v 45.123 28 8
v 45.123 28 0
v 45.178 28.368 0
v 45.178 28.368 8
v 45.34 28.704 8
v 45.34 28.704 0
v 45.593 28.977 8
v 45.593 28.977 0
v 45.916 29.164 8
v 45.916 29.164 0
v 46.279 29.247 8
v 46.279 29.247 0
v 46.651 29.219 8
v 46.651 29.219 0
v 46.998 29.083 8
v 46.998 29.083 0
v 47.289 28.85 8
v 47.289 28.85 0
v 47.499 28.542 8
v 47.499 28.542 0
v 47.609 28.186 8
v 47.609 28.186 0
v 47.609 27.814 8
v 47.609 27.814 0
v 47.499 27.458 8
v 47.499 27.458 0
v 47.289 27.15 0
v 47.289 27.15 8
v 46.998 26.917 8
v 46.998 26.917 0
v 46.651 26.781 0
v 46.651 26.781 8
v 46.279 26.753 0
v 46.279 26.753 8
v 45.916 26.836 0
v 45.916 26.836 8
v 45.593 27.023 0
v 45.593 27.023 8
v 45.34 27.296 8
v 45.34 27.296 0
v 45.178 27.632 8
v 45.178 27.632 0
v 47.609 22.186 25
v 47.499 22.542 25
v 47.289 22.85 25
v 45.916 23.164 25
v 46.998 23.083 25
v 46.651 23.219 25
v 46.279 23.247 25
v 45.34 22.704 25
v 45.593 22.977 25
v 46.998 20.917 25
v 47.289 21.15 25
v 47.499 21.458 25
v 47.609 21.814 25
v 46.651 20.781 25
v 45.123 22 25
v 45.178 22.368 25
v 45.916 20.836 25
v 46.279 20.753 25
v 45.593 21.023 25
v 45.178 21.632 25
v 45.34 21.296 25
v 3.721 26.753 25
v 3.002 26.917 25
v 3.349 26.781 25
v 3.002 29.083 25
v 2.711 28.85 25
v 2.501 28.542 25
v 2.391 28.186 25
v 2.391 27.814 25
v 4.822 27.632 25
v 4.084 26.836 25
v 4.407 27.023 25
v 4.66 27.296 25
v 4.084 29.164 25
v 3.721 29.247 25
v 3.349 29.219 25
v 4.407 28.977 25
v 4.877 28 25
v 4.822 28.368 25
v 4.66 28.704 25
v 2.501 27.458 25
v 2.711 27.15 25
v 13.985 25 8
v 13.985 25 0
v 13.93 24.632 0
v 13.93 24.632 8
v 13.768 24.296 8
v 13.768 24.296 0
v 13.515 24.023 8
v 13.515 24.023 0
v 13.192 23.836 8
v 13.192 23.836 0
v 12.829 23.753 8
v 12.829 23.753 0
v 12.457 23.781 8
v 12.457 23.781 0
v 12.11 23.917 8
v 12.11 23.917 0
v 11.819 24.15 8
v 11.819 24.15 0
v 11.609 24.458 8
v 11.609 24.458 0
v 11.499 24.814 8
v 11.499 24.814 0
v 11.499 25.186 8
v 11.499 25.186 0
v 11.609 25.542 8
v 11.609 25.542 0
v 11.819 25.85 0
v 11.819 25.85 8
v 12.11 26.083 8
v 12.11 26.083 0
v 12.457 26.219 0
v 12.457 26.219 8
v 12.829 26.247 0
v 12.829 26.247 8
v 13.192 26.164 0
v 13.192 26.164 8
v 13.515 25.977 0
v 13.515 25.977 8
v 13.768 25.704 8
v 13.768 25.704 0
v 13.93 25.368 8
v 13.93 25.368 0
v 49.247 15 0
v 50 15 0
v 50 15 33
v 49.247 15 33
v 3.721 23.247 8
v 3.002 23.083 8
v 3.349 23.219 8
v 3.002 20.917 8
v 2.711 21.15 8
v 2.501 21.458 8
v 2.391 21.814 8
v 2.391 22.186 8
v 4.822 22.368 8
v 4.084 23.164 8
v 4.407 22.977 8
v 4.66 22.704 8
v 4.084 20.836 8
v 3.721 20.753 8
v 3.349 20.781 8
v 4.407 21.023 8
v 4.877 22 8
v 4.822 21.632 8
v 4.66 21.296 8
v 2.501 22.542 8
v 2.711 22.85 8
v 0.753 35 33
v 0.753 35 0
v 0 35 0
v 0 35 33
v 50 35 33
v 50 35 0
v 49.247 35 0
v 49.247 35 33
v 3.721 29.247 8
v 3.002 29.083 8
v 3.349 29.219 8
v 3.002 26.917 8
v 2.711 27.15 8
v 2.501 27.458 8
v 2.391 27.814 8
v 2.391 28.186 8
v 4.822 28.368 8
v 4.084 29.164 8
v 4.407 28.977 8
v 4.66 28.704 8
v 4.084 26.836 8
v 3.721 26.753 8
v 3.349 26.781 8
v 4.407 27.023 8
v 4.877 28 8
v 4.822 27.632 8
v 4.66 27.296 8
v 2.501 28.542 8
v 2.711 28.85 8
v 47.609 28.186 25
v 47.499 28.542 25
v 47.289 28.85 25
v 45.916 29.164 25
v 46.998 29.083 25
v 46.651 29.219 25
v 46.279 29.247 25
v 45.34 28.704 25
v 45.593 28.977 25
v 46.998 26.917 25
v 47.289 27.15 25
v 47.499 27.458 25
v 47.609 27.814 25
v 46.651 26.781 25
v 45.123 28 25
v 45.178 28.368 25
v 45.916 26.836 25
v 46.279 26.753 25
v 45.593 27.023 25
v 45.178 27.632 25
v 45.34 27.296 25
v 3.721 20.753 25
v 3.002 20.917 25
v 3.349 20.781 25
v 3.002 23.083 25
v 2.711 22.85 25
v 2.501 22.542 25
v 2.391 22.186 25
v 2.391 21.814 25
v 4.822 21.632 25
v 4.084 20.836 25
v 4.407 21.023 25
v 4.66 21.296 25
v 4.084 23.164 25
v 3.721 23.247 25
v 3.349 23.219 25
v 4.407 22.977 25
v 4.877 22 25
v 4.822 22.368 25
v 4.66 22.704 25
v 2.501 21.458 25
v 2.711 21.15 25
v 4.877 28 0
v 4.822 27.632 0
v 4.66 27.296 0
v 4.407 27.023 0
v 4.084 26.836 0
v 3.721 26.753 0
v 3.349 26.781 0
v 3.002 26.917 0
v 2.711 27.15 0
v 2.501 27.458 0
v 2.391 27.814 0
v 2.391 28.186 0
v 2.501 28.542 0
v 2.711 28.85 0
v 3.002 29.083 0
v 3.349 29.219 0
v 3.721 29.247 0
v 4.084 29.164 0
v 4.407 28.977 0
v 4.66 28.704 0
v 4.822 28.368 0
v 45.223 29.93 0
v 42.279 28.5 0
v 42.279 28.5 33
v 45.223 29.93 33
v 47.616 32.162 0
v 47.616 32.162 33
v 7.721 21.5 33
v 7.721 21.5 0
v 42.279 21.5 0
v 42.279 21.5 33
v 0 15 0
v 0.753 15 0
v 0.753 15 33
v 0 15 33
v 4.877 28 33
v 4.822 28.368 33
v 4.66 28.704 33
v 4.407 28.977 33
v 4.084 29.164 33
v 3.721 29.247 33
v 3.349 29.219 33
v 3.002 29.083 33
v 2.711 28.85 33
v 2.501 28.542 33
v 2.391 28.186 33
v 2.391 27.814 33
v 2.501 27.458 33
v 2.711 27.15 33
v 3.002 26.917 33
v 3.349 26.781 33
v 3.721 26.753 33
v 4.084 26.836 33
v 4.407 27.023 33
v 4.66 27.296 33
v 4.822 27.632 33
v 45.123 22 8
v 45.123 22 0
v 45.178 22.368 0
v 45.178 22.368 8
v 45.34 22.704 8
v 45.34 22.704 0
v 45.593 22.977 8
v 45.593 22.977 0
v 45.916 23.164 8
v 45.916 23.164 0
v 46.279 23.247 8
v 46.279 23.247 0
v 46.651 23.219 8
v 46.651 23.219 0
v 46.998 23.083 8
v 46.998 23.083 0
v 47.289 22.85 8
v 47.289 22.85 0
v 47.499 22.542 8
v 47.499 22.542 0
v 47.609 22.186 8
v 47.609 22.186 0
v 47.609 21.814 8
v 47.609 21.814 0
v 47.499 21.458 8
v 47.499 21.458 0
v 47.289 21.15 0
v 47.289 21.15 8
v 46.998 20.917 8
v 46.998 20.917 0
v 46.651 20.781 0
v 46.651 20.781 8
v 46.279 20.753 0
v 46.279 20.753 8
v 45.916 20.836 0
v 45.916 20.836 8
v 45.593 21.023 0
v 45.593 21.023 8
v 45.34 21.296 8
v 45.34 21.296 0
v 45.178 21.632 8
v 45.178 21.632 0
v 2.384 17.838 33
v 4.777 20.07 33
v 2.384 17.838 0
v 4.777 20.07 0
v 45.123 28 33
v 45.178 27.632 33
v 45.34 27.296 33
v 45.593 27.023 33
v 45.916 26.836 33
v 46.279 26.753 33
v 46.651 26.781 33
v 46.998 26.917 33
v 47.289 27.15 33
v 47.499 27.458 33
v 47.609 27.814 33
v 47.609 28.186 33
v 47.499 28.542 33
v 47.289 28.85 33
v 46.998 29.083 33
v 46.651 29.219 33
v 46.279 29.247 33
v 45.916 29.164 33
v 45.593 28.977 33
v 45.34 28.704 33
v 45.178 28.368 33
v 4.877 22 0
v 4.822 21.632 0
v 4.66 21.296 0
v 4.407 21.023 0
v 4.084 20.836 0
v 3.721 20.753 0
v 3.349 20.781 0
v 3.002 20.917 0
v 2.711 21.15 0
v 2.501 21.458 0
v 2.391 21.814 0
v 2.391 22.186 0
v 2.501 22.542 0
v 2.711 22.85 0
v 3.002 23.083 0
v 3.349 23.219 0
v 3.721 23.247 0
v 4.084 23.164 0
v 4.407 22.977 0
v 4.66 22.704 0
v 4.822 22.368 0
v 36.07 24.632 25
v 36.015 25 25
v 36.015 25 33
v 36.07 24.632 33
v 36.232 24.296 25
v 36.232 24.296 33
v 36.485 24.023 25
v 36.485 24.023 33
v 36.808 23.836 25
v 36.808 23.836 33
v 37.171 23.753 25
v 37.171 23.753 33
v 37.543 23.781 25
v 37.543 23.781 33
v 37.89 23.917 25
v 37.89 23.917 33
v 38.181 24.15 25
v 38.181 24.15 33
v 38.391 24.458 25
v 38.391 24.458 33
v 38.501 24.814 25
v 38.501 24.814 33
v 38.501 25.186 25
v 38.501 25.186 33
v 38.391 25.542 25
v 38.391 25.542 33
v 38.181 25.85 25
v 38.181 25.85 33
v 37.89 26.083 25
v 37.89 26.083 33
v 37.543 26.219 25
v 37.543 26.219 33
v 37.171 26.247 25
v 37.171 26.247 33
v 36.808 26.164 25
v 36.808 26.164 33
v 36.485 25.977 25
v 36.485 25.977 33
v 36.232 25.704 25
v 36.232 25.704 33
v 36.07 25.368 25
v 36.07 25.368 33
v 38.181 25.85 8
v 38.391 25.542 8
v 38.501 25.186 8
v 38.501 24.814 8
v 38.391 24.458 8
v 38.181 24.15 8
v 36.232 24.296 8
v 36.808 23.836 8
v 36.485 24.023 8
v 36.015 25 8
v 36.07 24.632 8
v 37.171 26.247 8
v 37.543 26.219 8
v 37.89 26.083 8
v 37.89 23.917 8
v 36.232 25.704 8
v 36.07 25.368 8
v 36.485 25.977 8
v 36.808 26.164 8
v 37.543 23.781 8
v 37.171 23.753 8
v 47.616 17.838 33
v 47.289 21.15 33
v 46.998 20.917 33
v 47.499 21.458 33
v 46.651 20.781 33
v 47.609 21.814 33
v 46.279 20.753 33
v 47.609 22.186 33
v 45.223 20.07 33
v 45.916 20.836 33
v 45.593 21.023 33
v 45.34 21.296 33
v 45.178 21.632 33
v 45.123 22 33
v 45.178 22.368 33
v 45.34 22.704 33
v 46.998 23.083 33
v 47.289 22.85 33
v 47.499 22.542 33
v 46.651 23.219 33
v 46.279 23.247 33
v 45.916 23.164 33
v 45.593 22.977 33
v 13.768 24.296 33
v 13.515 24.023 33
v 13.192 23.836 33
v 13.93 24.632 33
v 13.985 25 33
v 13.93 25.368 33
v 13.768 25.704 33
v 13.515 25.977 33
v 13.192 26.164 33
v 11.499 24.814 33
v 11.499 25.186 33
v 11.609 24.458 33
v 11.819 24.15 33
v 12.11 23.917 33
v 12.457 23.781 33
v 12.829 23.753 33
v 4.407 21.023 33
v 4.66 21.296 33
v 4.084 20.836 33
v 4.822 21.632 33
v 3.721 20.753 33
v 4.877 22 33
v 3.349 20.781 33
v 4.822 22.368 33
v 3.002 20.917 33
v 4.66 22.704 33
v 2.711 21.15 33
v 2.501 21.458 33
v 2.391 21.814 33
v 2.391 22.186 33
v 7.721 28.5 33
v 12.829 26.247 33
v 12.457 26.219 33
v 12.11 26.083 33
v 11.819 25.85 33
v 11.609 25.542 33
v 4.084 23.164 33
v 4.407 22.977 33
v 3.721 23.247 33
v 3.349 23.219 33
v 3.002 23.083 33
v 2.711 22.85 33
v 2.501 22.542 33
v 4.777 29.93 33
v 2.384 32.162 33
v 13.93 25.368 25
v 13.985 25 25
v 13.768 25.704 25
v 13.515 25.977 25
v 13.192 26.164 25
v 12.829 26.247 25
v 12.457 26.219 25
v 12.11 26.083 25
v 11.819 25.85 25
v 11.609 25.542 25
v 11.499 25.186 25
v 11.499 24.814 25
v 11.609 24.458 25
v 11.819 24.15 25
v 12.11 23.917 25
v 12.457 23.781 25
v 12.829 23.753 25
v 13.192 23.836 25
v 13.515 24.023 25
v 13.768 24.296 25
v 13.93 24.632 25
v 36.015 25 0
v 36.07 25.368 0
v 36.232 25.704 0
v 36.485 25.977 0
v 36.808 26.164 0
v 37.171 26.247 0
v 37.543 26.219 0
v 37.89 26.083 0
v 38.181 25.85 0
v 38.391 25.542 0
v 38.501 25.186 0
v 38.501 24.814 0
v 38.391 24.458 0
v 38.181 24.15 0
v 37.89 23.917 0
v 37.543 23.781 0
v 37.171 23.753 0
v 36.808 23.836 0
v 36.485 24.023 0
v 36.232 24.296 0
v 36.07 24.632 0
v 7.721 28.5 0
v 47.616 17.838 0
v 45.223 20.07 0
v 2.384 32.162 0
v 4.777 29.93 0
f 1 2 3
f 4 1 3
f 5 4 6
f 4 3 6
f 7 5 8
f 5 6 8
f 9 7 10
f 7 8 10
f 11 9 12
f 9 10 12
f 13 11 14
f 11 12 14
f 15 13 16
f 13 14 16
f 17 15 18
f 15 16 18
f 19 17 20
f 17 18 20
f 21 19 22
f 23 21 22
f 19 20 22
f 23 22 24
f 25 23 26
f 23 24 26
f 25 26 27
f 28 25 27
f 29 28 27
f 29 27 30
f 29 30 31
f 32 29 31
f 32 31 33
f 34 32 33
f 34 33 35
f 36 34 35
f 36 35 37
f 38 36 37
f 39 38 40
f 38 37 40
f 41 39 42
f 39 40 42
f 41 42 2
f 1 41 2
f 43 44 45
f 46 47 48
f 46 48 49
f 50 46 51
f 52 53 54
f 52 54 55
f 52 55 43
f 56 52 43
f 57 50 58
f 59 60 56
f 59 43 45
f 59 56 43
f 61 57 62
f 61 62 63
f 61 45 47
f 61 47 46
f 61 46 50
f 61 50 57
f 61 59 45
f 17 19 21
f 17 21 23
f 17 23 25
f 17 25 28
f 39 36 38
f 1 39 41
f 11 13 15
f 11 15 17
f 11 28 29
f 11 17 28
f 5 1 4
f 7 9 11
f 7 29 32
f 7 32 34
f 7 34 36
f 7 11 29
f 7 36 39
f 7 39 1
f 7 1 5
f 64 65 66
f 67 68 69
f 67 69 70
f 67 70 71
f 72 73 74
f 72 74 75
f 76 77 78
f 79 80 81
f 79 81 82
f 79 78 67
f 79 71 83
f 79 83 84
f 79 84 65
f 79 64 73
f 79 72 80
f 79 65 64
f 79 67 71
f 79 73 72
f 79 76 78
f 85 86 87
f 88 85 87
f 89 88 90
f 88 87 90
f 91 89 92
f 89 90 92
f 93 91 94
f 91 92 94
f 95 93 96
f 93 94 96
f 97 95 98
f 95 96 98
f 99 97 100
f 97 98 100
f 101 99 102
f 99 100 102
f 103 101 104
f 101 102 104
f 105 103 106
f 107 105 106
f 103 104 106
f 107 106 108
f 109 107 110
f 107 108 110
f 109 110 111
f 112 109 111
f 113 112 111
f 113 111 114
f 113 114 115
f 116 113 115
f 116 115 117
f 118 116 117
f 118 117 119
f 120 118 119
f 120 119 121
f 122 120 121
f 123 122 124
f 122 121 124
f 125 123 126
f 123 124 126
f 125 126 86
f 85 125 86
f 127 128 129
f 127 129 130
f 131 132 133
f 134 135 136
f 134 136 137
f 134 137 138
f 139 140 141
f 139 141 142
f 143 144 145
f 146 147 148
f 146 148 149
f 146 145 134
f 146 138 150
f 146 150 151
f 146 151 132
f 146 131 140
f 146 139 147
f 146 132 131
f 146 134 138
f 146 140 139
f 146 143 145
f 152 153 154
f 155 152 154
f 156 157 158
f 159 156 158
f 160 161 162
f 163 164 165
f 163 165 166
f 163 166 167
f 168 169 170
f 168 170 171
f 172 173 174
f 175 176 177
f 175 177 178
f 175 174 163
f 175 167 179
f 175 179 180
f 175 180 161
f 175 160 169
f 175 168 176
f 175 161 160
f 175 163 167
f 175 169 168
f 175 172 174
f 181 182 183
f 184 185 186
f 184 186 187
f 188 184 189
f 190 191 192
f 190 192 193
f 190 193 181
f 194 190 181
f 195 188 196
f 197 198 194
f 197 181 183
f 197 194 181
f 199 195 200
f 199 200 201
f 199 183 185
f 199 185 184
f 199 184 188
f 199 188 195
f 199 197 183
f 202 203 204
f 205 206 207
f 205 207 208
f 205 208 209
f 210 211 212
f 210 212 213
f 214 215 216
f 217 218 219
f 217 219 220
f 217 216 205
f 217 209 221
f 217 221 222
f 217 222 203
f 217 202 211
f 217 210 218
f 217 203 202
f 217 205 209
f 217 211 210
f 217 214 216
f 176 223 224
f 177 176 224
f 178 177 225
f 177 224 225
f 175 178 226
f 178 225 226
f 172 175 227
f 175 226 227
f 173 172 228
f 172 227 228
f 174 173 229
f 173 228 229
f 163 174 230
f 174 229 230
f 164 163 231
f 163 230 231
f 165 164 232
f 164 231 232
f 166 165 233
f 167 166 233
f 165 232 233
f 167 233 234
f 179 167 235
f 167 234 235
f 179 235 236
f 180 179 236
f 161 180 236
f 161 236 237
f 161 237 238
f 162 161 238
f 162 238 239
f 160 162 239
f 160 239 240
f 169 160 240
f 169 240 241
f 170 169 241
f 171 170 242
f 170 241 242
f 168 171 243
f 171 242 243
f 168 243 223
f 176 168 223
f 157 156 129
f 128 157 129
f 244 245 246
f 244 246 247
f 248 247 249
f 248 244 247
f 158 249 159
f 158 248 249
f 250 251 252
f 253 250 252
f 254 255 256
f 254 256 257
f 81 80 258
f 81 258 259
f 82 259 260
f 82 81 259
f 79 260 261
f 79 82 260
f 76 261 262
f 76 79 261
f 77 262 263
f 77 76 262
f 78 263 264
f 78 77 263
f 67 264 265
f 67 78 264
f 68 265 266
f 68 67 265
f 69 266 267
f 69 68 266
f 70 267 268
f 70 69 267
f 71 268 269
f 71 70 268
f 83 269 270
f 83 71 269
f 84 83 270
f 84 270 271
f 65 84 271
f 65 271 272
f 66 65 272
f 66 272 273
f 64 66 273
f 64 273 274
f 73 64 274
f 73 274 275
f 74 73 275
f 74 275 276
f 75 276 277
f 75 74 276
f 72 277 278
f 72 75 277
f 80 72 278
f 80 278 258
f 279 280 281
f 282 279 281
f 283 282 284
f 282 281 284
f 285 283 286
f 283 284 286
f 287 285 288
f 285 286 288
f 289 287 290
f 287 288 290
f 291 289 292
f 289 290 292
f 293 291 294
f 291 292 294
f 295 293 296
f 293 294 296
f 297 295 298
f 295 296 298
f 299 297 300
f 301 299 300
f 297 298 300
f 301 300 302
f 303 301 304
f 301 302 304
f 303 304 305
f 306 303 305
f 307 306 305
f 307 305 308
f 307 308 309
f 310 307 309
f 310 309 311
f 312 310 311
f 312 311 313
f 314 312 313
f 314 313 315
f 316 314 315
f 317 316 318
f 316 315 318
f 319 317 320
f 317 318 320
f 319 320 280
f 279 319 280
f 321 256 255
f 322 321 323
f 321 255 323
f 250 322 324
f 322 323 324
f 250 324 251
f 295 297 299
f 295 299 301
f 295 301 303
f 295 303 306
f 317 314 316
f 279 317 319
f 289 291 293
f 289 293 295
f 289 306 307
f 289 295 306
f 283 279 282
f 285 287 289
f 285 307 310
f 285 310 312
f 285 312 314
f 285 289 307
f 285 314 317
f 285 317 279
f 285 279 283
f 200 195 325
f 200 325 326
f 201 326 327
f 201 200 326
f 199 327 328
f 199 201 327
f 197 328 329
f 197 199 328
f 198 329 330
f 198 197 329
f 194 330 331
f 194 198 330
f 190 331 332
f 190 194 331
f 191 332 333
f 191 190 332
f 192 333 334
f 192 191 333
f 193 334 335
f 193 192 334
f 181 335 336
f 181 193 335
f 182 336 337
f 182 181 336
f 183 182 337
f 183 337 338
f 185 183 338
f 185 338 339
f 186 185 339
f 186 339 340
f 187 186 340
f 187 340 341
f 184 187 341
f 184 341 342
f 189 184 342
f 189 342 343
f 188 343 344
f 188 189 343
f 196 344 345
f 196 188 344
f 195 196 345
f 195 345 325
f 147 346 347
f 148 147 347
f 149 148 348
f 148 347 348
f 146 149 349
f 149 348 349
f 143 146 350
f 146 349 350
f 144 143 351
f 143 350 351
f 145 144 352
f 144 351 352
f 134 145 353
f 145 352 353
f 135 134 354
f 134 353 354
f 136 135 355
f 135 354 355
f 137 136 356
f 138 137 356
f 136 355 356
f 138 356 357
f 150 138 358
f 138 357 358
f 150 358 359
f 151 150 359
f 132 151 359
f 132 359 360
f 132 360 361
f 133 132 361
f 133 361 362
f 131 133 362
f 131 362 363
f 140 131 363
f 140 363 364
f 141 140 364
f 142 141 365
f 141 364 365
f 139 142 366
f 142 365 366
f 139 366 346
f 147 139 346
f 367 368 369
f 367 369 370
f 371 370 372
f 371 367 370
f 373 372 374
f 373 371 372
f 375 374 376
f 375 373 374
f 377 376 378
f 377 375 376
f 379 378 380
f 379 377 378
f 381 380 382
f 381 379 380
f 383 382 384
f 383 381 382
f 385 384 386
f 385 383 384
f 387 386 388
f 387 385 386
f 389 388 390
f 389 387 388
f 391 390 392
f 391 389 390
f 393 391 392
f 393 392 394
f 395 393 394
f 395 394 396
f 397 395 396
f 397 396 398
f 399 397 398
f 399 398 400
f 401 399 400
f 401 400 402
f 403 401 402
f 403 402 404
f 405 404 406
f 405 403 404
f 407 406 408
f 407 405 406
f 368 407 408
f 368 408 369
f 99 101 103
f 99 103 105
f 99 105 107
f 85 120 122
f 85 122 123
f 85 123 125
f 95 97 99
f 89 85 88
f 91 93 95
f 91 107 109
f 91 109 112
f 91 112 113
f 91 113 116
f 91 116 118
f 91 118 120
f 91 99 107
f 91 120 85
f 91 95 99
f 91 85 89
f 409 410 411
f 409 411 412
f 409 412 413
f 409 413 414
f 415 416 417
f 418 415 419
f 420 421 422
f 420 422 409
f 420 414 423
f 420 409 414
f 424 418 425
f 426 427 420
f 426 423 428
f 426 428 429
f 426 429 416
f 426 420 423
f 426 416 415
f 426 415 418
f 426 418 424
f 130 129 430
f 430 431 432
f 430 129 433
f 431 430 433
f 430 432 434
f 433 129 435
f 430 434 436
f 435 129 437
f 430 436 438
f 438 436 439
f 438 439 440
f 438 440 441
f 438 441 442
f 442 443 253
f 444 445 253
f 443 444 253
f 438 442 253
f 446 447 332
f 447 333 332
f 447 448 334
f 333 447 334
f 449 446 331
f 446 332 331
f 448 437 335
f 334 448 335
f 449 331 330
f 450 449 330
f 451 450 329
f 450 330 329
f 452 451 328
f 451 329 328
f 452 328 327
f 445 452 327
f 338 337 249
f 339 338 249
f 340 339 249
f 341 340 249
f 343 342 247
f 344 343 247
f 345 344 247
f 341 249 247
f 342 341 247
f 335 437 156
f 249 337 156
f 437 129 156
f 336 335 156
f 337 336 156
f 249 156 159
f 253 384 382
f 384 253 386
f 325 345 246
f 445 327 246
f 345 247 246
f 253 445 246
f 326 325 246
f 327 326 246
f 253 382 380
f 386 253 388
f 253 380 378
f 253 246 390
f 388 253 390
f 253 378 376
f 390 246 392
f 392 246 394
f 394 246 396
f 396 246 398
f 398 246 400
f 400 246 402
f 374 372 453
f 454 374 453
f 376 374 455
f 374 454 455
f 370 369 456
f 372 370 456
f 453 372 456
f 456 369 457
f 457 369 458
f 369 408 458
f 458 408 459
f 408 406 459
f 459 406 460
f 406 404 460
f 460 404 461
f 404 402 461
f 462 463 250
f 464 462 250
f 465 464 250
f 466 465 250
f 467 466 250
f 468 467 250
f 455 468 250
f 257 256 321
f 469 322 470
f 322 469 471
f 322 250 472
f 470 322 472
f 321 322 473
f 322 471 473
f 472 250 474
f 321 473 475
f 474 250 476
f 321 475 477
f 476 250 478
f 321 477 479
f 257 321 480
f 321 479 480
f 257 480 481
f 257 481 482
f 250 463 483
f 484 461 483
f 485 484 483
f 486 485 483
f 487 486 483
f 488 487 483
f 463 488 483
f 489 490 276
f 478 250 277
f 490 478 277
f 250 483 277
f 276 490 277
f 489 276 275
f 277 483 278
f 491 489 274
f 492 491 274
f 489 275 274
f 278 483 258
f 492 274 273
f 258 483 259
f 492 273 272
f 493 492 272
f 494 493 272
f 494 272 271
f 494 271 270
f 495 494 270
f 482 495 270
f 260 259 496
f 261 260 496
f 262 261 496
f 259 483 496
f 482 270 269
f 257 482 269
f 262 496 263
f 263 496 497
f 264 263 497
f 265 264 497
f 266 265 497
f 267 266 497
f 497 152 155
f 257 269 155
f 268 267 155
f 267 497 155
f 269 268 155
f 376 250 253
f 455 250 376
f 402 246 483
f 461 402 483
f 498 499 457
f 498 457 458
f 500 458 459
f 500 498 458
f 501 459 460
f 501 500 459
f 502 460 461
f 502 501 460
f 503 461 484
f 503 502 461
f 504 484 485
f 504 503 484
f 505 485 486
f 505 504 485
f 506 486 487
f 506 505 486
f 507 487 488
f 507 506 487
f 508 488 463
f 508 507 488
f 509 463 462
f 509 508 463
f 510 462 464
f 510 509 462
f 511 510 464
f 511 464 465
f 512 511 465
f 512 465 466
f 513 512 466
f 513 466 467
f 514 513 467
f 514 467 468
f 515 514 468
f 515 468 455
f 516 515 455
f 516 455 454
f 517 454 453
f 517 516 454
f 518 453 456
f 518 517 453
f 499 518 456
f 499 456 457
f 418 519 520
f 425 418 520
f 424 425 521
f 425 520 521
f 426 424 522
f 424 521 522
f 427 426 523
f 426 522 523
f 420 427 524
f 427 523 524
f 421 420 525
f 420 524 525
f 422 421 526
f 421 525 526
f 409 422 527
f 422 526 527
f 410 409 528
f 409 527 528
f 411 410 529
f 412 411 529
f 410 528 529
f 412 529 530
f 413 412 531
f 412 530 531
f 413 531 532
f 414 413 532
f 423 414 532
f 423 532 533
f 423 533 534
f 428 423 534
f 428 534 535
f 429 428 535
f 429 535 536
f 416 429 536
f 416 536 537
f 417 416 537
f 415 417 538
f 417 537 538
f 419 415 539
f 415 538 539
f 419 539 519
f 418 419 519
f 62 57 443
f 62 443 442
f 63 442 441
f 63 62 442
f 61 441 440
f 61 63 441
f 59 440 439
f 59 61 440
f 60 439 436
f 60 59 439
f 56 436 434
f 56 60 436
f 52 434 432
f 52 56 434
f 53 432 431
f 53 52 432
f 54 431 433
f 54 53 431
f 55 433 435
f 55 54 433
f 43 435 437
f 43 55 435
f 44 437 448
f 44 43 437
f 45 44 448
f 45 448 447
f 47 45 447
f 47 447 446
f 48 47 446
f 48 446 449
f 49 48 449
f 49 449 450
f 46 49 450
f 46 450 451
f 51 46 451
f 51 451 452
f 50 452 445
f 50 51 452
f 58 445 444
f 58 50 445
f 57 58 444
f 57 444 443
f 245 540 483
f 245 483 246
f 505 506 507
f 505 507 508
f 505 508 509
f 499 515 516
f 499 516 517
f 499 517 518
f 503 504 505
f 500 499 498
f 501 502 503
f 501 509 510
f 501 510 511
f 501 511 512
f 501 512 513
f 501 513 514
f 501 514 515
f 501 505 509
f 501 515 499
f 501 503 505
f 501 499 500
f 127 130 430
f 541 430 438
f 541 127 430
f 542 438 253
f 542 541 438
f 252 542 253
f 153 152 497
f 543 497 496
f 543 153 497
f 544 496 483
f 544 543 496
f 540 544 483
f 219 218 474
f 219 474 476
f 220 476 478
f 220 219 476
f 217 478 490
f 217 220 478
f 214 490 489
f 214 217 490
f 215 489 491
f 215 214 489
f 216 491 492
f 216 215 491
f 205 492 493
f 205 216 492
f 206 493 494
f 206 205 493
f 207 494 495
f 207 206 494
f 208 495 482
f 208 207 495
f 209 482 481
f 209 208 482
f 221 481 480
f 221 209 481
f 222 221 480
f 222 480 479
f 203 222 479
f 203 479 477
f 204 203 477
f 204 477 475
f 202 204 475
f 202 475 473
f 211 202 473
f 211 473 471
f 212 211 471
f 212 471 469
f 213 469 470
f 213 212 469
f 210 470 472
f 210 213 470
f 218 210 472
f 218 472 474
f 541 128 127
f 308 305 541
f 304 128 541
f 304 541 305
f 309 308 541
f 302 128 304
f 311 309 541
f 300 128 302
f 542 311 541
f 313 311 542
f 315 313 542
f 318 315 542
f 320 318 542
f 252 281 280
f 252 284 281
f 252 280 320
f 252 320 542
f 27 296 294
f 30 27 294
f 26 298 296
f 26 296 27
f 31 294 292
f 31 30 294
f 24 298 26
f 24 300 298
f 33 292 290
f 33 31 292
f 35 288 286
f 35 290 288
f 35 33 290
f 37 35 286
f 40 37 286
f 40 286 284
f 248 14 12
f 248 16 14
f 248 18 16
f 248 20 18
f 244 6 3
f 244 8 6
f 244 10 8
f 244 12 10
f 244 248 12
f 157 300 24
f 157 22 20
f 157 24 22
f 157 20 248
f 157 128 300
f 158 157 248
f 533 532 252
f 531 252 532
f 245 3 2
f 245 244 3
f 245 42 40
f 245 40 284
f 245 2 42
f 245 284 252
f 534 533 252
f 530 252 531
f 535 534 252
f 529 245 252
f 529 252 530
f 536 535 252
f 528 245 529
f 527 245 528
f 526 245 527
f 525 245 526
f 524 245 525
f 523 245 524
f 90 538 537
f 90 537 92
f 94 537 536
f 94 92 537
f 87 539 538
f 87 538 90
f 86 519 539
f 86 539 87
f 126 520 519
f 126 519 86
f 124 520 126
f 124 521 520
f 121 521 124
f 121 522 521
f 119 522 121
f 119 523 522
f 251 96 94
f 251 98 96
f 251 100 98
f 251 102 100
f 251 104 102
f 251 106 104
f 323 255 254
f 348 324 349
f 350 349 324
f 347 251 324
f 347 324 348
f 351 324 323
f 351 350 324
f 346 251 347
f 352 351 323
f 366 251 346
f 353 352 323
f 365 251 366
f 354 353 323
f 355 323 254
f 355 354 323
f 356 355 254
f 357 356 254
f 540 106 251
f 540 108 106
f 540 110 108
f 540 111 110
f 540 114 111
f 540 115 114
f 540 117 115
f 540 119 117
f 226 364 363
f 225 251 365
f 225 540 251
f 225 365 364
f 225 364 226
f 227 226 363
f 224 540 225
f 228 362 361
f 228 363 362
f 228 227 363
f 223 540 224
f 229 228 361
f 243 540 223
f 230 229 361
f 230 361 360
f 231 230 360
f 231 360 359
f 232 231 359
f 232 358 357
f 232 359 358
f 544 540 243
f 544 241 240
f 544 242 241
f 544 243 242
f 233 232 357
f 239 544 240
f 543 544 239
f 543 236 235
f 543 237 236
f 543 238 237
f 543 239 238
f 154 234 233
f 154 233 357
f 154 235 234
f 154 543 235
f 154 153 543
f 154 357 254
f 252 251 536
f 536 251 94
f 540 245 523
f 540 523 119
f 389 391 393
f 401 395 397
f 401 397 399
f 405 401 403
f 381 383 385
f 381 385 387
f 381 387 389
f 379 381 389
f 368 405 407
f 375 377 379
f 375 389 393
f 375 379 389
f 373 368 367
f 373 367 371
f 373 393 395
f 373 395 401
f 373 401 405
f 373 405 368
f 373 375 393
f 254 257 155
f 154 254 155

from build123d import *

# Parameters (mm, degrees)
SKETCH_3_W          = 50
SKETCH_3_H          = 7
EXTRUDE_1_DEPTH     = 33
EXTRUDE_2_DEPTH     = 33
SKETCH_5_R          = 1.25
CUT_EXTRUDE_1_DEPTH = 8
SKETCH_6_W          = 50
SKETCH_6_H          = 4
CUT_EXTRUDE_2_DEPTH = 40
CUT_EXTRUDE_START   = -8
SKETCH_7_R          = 1.25
CUT_EXTRUDE_3_DEPTH = 8


with BuildPart() as part:
    # 草图3 → 凸台-拉伸1 (new body)
    with BuildSketch(Plane.XY):
        with Locations((25, 25)):
            Rectangle(SKETCH_3_W, SKETCH_3_H)
    extrude(amount=EXTRUDE_1_DEPTH)

    # 草图4 → 凸台-拉伸2 (add)
    with BuildSketch(Plane(origin=(0, 0, 0), x_dir=(-1, 0, 0), z_dir=(0, 0, -1))):
        with BuildLine():
            Line((-50, 21.5), (-50, 11))
            ThreePointArc((-50, 11), (-47.86188219, 17.51667431), (-42.278719262, 21.5))
            Line((-42.278719262, 21.5), (-50, 21.5))
        make_face()
        with BuildLine():
            Line((-7.721280738, 21.5), (0, 21.5))
            Line((0, 21.5), (0, 11))
            ThreePointArc((0, 11), (-2.13811781, 17.51667431), (-7.721280738, 21.5))
        make_face()
        with BuildLine():
            Line((0, 28.5), (0, 39))
            ThreePointArc((0, 39), (-2.13811781, 32.48332569), (-7.721280738, 28.5))
            Line((-7.721280738, 28.5), (0, 28.5))
        make_face()
        with BuildLine():
            Line((-50, 28.5), (-42.278719262, 28.5))
            ThreePointArc((-42.278719262, 28.5), (-47.86188219, 32.48332569), (-50, 39))
            Line((-50, 39), (-50, 28.5))
        make_face()
    extrude(amount=-EXTRUDE_2_DEPTH)

    # 草图5 → 切除-拉伸1 (cut)
    with BuildSketch(Plane(origin=(0, 0, 0), x_dir=(-1, 0, 0), z_dir=(0, 0, -1))):
        with Locations((-46.372516673, 28)):
            Circle(SKETCH_5_R)
        with Locations((-46.372516673, 22)):
            Circle(SKETCH_5_R)
        with Locations((-37.264513071, 25)):
            Circle(SKETCH_5_R)
        with Locations(Location((-3.627483327, 22, 0), (0, 0, 180))):
            Circle(SKETCH_5_R)
        with Locations(Location((-3.627483327, 28, 0), (0, 0, 180))):
            Circle(SKETCH_5_R)
        with Locations(Location((-12.735486929, 25, 0), (0, 0, 180))):
            Circle(SKETCH_5_R)
    extrude(amount=-CUT_EXTRUDE_1_DEPTH, mode=Mode.SUBTRACT)

    # 草图6 → 切除-拉伸2 (cut)
    with BuildSketch(Plane(origin=(0, 0, 0), x_dir=(-1, 0, 0), z_dir=(0, 0, -1))):
        with Locations((-25, 37)):
            Rectangle(SKETCH_6_W, SKETCH_6_H)
        with Locations((-25, 13)):
            Rectangle(SKETCH_6_W, SKETCH_6_H)
    extrude(amount=-CUT_EXTRUDE_2_DEPTH, mode=Mode.SUBTRACT)

    # 草图7 → 切除-拉伸3 (cut)
    with BuildSketch(Plane.XY.offset(33).offset(CUT_EXTRUDE_START)):
        with Locations((3.627483327, 28)):
            Circle(SKETCH_7_R)
        with Locations((3.627483327, 22)):
            Circle(SKETCH_7_R)
        with Locations((12.735486929, 25)):
            Circle(SKETCH_7_R)
        with Locations(Location((46.372516673, 22, 0), (0, 0, 180))):
            Circle(SKETCH_7_R)
        with Locations(Location((46.372516673, 28, 0), (0, 0, 180))):
            Circle(SKETCH_7_R)
        with Locations(Location((37.264513071, 25, 0), (0, 0, 180))):
            Circle(SKETCH_7_R)
    extrude(amount=CUT_EXTRUDE_3_DEPTH, mode=Mode.SUBTRACT)


solid = part.part
